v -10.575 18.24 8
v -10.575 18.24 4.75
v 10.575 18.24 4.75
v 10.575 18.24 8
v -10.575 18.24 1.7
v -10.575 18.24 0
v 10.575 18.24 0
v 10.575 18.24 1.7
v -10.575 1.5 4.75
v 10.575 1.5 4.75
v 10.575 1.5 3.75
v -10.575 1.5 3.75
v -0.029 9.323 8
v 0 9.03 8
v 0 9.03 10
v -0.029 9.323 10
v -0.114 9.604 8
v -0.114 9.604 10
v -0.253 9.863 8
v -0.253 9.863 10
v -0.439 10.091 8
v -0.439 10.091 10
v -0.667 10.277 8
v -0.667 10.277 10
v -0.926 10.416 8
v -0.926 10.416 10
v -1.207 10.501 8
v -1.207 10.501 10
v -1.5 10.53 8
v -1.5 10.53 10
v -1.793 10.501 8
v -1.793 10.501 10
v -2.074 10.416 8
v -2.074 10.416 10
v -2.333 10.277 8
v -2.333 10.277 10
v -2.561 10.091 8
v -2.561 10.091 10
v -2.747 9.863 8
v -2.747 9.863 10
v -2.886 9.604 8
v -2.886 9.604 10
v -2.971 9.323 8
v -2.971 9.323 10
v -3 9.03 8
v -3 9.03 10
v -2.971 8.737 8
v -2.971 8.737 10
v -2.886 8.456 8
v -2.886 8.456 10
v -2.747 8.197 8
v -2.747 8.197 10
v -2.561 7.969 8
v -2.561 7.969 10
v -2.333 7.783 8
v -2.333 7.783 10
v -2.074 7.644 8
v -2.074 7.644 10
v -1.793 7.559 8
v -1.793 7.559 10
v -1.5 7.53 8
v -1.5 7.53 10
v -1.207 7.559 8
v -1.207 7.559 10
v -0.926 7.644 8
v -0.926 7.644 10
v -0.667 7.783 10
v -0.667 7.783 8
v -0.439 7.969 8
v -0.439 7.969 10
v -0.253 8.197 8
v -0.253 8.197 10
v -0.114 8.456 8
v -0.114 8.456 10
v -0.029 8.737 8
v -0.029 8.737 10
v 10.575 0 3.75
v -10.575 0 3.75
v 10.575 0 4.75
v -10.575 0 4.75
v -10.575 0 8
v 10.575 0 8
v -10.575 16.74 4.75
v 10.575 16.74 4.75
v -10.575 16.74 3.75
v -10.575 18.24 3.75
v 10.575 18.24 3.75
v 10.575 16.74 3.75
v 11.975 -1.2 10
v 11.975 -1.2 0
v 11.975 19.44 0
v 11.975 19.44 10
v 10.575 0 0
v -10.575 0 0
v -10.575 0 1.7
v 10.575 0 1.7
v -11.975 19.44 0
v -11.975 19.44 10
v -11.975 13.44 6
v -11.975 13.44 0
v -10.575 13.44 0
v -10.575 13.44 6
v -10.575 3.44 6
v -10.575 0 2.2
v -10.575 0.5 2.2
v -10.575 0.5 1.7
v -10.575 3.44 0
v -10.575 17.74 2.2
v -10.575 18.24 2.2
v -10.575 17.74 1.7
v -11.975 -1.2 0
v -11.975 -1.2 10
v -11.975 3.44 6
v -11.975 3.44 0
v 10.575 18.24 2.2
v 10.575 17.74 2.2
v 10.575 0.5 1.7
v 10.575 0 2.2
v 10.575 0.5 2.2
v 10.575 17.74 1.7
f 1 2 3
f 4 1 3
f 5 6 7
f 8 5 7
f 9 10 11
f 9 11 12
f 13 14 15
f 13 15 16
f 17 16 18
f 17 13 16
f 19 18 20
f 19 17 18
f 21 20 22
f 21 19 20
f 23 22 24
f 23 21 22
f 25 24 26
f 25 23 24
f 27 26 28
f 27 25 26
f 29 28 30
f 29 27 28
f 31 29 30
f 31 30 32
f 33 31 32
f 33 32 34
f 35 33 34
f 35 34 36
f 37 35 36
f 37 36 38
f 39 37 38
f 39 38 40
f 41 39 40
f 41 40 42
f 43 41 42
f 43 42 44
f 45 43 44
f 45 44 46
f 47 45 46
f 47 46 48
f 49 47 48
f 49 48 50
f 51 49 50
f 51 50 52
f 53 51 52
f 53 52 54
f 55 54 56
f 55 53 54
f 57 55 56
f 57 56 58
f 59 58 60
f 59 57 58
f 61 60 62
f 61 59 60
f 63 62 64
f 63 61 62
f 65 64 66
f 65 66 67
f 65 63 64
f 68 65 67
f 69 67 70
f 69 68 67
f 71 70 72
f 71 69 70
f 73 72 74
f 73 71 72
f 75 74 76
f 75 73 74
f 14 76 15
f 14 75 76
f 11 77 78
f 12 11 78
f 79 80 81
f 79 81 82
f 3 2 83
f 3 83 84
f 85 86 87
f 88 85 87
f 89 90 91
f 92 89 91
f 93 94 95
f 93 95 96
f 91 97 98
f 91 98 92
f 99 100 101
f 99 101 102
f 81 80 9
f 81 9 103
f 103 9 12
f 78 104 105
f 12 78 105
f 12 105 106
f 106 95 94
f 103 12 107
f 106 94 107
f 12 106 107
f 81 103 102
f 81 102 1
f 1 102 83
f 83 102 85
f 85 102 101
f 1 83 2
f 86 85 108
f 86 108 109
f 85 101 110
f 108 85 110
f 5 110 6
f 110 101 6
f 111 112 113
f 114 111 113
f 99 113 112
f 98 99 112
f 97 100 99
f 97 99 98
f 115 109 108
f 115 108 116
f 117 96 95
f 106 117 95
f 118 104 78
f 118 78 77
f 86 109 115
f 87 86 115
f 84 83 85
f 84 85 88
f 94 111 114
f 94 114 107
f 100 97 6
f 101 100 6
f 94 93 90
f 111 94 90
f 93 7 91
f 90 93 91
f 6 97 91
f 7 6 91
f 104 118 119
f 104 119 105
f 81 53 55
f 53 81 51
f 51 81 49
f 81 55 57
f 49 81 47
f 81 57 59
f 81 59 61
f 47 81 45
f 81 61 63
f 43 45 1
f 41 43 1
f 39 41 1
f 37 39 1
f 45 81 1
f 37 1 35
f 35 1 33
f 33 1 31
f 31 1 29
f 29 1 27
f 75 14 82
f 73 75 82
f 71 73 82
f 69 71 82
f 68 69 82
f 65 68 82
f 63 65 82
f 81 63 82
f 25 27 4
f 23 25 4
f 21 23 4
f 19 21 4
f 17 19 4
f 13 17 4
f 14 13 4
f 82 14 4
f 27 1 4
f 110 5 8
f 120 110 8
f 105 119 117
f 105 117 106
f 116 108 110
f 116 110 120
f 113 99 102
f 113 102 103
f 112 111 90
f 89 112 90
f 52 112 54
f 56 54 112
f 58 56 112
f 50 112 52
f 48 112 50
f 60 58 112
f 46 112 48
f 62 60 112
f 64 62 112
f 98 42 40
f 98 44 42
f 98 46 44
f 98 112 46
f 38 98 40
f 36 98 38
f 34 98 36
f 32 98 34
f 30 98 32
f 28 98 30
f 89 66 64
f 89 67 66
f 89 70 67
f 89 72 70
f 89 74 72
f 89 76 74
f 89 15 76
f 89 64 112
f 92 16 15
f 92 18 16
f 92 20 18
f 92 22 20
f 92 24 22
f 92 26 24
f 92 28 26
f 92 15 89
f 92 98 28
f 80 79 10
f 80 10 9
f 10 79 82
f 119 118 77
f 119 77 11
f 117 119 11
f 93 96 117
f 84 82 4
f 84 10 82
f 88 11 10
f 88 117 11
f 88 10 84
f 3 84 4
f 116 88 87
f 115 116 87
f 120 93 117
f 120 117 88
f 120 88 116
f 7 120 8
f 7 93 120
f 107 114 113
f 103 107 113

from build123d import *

# Parameters (mm, degrees)
SKETCH001_W     = 23.95
SKETCH001_H     = 20.64
SKETCH001_R     = 1.5
PAD_DEPTH       = 10
SKETCH_W        = 21.15
SKETCH_H        = 18.24
POCKET_DEPTH    = 8
SKETCH002_W     = 21.15
SKETCH002_H     = 1
PAD001_DEPTH    = 1.5
SKETCH003_W     = 21.15
SKETCH003_H     = 1
PAD002_DEPTH    = 1.5
SKETCH004_W     = 21.15
SKETCH004_H     = 0.5
PAD003_DEPTH    = 0.5
SKETCH005_W     = 21.15
SKETCH005_H     = 0.5
PAD004_DEPTH    = 0.5
SKETCH006_W     = 10
SKETCH006_H     = 6
POCKET001_DEPTH = 5


with BuildPart() as part:
    # Sketch001 → Pad (new body)
    with BuildSketch(Plane.XY):
        with Locations((0, 9.12)):
            Rectangle(SKETCH001_W, SKETCH001_H)
        with Locations((-1.5, 9.03)):
            Circle(SKETCH001_R, mode=Mode.SUBTRACT)
    extrude(amount=PAD_DEPTH)

    # Sketch → Pocket (cut)
    with BuildSketch(Plane.XY):
        with Locations((0, 9.12)):
            Rectangle(SKETCH_W, SKETCH_H)
    extrude(amount=POCKET_DEPTH, mode=Mode.SUBTRACT)

    # Sketch002 (on Face8 of Pocket) → Pad001 (join)
    with BuildSketch(Plane(origin=(0, 0, 0), x_dir=(-1, 0, 0), z_dir=(0, 1, 0))):
        with Locations((0, 4.25)):
            Rectangle(SKETCH002_W, SKETCH002_H)
    extrude(amount=PAD001_DEPTH)

    # Sketch003 (on Face10 of Pad001) → Pad002 (join)
    with BuildSketch(Plane.XZ.offset(-18.24)):
        with Locations((0, 4.25)):
            Rectangle(SKETCH003_W, SKETCH003_H)
    extrude(amount=PAD002_DEPTH)

    # Sketch004 (on Face10 of Pad002) → Pad003 (join)
    with BuildSketch(Plane.XZ.offset(-18.24)):
        with Locations((0, 1.95)):
            Rectangle(SKETCH004_W, SKETCH004_H)
    extrude(amount=PAD003_DEPTH)

    # Sketch005 (on Face8 of Pad003) → Pad004 (join)
    with BuildSketch(Plane(origin=(0, 0, 0), x_dir=(-1, 0, 0), z_dir=(0, 1, 0))):
        with Locations((0, 1.95)):
            Rectangle(SKETCH005_W, SKETCH005_H)
    extrude(amount=PAD004_DEPTH)

    # Sketch006 (on Face2 of Pad004) → Pocket001 (cut)
    with BuildSketch(Plane(origin=(-11.975, 0, 0), x_dir=(0, -1, 0), z_dir=(-1, 0, 0))):
        with Locations((-8.44, 3)):
            Rectangle(SKETCH006_W, SKETCH006_H)
    extrude(amount=-POCKET001_DEPTH, mode=Mode.SUBTRACT)


solid = part.part
